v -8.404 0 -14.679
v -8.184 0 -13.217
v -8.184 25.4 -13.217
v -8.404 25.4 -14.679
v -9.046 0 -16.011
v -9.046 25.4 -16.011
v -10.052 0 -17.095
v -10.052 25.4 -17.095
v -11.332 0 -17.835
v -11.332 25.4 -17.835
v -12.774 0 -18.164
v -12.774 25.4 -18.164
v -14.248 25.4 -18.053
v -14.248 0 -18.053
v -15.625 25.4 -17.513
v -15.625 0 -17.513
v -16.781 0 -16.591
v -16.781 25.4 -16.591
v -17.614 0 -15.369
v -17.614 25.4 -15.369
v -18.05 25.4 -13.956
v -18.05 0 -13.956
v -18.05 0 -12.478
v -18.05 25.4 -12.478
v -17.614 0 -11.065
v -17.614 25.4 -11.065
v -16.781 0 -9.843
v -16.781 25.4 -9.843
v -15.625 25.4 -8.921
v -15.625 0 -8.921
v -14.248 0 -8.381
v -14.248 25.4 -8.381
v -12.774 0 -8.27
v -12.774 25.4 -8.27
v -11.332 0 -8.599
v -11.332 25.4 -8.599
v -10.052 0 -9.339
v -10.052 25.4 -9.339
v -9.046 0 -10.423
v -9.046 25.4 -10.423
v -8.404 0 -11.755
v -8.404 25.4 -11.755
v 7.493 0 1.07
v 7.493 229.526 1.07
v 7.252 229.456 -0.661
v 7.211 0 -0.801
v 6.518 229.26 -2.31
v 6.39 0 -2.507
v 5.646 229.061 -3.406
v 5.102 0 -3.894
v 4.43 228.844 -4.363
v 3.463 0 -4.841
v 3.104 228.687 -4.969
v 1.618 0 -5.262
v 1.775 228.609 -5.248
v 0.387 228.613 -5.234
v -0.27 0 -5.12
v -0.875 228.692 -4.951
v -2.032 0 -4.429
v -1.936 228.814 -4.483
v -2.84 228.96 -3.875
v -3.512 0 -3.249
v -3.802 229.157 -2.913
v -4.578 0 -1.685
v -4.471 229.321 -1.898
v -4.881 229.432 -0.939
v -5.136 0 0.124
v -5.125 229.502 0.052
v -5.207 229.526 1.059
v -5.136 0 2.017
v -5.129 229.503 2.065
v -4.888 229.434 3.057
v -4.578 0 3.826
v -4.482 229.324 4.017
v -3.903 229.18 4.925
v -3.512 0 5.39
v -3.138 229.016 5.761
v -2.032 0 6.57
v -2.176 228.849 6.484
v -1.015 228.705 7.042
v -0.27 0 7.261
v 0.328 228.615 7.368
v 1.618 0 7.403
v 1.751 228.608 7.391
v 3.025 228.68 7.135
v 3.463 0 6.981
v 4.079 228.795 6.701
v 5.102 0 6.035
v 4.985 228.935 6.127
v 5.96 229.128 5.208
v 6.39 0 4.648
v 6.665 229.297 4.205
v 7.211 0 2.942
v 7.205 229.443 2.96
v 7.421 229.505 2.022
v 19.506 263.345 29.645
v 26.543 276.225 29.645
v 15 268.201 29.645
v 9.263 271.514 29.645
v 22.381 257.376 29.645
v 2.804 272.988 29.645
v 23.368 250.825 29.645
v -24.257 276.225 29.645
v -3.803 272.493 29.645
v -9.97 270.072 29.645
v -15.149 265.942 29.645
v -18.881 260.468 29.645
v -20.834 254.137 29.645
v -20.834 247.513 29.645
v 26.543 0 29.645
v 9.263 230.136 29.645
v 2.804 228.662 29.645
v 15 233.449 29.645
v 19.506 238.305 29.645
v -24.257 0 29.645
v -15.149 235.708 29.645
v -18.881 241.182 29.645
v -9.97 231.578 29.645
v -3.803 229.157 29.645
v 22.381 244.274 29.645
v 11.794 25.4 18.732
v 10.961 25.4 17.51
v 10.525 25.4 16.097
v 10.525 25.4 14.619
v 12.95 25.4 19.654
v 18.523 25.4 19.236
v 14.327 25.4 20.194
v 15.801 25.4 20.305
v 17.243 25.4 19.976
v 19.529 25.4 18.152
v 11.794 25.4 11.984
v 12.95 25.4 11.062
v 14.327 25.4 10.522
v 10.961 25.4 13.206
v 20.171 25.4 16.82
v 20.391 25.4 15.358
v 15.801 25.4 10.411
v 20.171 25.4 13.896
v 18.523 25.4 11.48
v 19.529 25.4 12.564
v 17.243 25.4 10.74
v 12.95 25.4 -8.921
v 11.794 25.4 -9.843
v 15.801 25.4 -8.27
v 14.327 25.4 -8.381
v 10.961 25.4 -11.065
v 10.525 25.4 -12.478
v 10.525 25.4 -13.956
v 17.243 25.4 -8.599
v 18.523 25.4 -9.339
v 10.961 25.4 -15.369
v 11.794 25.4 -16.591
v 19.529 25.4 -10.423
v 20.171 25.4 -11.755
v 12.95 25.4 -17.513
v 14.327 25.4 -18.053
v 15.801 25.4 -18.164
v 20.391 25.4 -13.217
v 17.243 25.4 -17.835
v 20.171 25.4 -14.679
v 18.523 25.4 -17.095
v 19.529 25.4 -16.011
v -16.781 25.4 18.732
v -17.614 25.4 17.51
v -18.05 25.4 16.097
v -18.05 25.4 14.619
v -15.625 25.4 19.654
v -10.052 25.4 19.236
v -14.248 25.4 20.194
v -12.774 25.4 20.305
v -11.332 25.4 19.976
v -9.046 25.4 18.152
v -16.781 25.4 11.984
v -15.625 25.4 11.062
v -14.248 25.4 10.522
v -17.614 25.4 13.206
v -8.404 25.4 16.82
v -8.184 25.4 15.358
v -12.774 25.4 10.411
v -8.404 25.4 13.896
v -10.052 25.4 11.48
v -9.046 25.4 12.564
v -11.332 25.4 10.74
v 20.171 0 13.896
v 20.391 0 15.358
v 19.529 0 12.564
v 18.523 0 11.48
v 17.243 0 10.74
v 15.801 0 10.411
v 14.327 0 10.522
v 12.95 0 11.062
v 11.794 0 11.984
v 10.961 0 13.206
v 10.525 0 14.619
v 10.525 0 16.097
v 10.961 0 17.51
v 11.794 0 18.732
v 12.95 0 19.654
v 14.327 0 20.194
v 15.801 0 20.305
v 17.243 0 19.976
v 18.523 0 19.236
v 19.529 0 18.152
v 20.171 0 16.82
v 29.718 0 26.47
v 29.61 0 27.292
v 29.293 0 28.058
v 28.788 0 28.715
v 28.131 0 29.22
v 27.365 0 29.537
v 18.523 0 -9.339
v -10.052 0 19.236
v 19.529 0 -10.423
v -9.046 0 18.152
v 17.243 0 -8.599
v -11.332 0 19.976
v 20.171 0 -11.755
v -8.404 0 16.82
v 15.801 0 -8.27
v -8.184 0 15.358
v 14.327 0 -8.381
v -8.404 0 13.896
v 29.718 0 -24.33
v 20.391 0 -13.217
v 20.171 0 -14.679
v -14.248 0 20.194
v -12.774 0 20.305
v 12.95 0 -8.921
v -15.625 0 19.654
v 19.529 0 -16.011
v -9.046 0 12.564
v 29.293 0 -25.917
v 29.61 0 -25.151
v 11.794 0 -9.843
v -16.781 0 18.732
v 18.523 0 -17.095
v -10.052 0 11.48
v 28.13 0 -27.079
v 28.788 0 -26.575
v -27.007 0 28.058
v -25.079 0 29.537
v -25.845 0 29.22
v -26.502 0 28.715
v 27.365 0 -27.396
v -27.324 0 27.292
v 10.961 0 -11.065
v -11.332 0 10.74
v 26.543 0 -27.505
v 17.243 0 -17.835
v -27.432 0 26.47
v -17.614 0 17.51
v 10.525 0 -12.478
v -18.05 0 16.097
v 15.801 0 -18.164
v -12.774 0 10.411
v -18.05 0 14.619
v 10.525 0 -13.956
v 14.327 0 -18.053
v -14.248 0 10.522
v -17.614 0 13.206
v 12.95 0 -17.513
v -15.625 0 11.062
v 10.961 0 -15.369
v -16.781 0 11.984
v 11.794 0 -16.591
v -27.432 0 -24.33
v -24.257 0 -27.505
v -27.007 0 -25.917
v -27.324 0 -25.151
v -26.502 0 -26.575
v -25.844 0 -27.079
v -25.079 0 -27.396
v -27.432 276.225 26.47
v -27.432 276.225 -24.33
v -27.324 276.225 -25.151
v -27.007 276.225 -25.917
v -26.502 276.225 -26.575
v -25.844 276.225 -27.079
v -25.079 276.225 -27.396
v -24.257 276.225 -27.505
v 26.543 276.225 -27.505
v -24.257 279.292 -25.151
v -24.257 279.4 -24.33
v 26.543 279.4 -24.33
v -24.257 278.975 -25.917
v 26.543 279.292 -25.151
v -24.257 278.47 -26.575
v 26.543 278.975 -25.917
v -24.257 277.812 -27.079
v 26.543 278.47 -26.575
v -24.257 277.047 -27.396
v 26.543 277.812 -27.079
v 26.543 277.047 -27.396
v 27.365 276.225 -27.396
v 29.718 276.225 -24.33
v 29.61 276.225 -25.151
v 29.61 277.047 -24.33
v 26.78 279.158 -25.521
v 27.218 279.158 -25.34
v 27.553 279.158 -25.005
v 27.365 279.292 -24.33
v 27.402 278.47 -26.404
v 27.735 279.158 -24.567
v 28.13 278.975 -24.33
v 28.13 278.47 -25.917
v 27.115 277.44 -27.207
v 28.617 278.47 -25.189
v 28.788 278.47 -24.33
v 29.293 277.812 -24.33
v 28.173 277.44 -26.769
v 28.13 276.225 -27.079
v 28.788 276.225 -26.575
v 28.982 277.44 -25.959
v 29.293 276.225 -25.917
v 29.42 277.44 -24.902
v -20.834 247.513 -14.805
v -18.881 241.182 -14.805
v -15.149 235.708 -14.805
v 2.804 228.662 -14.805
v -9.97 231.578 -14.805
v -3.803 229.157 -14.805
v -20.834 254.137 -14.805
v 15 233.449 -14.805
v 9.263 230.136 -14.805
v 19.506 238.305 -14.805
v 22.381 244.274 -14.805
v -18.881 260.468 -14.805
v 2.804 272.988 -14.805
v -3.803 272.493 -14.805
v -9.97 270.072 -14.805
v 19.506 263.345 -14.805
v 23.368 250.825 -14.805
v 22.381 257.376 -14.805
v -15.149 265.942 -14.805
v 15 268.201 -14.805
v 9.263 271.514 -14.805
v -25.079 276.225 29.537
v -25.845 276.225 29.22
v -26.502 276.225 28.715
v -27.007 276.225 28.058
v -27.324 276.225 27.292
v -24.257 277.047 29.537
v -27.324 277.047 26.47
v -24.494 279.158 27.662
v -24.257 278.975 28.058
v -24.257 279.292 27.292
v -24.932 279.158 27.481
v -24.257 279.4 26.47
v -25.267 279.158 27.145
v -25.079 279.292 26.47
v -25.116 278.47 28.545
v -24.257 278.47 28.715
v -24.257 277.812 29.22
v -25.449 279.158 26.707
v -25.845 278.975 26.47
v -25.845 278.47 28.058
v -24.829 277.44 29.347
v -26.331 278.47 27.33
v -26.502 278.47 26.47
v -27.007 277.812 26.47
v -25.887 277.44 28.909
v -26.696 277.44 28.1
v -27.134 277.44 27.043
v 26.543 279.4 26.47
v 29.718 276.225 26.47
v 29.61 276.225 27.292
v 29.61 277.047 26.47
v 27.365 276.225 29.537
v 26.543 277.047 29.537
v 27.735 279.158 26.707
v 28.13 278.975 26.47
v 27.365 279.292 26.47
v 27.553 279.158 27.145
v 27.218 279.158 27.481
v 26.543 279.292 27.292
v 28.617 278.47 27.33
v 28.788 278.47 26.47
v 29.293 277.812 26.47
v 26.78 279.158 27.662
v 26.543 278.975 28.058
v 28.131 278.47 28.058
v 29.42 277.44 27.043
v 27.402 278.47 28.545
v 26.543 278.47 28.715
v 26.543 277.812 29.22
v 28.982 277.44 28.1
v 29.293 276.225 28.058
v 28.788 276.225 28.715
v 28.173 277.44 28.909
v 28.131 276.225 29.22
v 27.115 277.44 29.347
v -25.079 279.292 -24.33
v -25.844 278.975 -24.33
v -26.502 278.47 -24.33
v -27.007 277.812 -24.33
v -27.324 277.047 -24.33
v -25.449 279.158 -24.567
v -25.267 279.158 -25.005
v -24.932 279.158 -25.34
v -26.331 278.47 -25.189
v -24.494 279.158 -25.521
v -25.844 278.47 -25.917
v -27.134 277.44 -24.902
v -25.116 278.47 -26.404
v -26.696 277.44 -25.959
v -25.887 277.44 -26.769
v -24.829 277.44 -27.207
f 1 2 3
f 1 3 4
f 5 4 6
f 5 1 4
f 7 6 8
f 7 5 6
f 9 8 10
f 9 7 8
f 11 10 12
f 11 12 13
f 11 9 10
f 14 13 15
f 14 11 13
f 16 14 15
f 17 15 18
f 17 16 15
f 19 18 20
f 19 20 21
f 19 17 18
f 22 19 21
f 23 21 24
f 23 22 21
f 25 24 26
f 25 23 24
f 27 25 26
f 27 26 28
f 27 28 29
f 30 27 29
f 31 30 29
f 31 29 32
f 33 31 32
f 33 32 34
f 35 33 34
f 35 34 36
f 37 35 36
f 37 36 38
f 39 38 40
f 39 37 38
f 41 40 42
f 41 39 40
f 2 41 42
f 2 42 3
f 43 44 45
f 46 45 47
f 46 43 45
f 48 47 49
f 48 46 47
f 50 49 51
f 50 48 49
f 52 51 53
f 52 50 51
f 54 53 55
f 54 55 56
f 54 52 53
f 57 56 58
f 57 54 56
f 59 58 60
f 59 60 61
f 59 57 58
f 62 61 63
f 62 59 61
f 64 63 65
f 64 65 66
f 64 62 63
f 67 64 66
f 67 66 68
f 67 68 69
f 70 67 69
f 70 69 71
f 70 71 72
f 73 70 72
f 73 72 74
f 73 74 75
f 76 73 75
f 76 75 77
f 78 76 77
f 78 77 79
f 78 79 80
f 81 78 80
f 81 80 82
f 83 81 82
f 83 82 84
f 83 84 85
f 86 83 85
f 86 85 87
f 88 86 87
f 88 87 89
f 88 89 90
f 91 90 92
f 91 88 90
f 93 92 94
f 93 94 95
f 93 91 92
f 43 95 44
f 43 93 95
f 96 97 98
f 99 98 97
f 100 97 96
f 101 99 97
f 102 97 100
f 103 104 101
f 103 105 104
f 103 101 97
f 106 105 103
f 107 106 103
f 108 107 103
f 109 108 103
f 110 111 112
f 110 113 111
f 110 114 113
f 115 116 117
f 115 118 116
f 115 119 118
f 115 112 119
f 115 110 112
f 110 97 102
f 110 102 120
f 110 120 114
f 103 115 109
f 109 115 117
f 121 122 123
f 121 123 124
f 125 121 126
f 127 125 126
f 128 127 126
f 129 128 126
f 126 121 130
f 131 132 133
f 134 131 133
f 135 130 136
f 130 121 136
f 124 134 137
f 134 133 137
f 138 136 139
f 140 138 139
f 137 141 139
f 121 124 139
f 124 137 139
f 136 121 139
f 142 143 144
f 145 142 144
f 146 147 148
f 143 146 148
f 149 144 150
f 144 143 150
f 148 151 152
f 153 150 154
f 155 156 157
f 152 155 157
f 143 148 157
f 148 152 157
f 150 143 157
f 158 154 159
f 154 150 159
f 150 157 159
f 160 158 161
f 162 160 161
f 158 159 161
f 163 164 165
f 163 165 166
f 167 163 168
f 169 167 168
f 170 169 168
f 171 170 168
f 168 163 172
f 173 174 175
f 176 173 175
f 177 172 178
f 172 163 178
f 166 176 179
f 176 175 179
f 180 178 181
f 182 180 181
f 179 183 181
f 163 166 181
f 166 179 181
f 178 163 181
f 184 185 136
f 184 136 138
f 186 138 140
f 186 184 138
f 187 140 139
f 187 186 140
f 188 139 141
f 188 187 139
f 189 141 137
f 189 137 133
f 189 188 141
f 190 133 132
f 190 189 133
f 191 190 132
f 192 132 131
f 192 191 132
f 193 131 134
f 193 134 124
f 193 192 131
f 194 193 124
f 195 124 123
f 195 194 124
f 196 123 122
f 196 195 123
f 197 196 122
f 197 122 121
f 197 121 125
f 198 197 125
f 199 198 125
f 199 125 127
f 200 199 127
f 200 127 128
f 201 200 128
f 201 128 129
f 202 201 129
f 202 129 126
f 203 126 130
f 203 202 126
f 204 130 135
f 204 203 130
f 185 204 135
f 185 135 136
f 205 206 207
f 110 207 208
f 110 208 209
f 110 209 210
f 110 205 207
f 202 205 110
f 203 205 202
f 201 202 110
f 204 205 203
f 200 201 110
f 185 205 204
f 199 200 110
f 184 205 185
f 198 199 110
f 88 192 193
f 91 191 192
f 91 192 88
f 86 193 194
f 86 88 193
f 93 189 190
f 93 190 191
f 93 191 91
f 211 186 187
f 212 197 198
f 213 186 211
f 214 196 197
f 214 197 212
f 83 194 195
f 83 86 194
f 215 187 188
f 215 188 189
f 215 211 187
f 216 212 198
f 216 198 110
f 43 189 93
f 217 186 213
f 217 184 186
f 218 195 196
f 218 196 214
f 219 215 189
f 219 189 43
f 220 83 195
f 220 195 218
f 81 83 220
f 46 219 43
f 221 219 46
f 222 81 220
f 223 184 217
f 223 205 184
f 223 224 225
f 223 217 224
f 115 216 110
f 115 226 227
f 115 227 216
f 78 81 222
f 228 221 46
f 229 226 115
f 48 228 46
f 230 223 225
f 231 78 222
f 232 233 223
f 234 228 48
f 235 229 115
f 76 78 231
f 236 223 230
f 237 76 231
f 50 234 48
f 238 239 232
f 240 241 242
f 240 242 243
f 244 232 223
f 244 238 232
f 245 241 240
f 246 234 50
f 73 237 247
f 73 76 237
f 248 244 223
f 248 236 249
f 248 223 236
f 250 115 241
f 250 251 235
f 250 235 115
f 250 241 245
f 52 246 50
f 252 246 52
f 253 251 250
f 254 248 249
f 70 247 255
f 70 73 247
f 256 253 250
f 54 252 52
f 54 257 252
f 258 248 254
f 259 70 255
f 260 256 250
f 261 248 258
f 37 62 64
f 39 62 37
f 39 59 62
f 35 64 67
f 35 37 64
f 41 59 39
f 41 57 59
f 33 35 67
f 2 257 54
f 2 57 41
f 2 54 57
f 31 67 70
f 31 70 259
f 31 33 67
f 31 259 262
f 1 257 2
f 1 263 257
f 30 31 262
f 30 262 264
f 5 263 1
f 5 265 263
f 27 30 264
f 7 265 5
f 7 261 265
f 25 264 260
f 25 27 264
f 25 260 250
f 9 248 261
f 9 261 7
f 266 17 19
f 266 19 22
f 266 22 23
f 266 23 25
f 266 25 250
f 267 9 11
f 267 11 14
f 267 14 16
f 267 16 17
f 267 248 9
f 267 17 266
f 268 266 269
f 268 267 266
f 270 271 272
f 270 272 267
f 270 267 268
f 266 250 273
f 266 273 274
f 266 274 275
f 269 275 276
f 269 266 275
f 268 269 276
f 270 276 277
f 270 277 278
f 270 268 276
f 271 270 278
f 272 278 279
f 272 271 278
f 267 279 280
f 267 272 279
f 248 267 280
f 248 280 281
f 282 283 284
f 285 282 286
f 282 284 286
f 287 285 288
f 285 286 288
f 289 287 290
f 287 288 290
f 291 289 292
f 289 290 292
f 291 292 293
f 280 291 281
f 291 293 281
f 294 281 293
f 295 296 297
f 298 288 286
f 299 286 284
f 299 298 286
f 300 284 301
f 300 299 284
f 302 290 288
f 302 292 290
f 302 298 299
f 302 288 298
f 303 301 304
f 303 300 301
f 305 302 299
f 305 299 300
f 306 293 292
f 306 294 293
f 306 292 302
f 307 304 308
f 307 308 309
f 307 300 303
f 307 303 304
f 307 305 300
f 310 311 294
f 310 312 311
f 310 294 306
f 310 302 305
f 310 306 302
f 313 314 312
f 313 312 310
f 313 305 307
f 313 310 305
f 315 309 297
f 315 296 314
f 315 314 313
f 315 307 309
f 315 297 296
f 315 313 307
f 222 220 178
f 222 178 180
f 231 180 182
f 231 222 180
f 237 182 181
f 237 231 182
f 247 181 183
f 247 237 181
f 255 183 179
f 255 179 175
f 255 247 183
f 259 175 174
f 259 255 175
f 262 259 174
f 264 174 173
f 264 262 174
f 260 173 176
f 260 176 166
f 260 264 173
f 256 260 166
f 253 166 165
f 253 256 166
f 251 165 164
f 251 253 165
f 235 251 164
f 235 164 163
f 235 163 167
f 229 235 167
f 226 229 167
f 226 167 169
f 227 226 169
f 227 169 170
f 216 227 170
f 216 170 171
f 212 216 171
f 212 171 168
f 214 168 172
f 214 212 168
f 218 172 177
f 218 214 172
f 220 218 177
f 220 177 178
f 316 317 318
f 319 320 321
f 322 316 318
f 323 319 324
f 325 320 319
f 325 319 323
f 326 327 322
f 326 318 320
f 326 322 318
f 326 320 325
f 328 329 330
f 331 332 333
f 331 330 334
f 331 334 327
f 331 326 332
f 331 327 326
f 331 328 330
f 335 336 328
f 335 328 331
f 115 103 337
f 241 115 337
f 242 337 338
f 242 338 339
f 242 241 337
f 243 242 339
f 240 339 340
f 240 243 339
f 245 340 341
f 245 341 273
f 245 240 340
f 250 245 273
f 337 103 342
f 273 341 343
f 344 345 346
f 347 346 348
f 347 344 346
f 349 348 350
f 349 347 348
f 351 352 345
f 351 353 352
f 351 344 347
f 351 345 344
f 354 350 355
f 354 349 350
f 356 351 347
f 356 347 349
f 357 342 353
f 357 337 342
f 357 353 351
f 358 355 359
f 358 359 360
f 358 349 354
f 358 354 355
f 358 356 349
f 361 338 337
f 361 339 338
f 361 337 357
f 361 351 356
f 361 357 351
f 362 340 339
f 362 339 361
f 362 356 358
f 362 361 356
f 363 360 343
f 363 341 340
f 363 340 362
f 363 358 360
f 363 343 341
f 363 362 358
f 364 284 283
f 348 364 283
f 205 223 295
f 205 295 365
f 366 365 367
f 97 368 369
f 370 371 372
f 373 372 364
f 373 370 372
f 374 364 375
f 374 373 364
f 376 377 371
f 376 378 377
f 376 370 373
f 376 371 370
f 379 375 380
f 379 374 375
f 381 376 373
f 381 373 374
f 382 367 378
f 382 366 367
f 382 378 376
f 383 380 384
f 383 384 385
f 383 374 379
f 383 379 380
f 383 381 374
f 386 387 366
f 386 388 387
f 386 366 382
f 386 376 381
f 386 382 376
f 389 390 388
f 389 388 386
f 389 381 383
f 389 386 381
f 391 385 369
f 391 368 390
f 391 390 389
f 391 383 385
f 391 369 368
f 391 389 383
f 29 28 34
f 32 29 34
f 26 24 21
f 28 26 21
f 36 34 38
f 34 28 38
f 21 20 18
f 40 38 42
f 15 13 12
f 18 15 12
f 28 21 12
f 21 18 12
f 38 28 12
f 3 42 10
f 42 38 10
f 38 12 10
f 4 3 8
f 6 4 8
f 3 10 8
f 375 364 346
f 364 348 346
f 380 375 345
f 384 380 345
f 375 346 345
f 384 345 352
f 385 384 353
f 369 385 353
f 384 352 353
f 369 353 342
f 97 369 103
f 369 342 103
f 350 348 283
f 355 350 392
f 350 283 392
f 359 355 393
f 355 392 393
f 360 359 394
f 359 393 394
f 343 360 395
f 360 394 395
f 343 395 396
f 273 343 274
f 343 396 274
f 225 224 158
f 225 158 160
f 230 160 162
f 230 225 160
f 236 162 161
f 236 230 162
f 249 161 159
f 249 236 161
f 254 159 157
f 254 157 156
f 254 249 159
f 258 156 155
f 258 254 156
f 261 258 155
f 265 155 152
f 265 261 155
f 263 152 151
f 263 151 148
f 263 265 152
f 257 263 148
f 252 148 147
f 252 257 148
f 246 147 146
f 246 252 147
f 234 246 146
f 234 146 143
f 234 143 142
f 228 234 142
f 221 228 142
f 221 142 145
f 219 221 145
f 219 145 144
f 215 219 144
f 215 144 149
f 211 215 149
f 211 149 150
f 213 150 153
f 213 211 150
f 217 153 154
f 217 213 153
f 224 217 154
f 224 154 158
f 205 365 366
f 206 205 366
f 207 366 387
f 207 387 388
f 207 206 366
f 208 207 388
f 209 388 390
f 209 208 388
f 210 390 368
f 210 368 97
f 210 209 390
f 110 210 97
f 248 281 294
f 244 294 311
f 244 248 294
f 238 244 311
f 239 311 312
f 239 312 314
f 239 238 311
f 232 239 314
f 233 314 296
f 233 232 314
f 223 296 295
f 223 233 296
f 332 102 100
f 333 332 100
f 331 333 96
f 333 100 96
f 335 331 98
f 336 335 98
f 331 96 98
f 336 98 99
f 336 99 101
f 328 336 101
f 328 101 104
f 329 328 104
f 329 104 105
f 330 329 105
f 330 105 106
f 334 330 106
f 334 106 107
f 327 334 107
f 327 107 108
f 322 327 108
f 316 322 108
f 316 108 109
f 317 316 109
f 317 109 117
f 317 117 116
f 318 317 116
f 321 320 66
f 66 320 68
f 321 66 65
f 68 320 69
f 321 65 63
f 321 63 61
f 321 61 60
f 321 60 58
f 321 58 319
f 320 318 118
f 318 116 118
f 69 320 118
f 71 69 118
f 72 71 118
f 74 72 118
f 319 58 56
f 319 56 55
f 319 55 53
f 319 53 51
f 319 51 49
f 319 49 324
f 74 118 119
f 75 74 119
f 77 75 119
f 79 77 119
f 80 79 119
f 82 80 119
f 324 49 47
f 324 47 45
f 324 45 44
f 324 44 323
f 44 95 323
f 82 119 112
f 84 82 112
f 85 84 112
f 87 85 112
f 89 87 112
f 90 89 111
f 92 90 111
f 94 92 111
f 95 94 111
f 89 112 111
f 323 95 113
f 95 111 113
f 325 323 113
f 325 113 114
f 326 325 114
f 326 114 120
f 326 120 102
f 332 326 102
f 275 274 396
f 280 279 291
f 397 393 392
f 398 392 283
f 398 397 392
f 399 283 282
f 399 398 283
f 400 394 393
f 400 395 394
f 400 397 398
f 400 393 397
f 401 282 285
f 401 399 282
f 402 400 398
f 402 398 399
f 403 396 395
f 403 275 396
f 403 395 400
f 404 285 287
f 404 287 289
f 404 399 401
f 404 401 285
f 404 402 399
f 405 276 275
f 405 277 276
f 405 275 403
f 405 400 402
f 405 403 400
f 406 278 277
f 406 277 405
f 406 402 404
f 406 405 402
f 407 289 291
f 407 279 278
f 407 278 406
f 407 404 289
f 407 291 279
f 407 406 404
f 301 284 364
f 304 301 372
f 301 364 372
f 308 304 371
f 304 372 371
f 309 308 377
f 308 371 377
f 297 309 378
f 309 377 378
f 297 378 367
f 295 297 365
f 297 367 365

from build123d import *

# Parameters (mm, degrees)
BOSS_EXTRUDE1_DEPTH = 279.4
SKETCH1_4_R         = 4.96062
CUT_EXTRUDE1_DEPTH  = 25.4
SKETCH1_5_R         = 6.35
CUT_EXTRUDE2_DEPTH  = 250.825
FILLET1_R           = 3.175
SKETCH4_R           = 22.225
CUT_EXTRUDE3_DEPTH  = 44.45


with BuildPart() as part:
    # Sketch1 → Boss-Extrude1 (new body)
    with BuildSketch(Plane(origin=(0, 0, 0), x_dir=(1, 0, 0), z_dir=(0, 1, 0))):
        with BuildLine():
            Line((-24.257, 27.504571429), (26.543, 27.504571429))
            ThreePointArc((26.543, 27.504571429), (28.78806403, 26.574635459), (29.718, 24.329571429))
            Line((29.718, 24.329571429), (29.718, -26.470428571))
            ThreePointArc((29.718, -26.470428571), (28.78806403, -28.715492602), (26.543, -29.645428571))
            Line((26.543, -29.645428571), (-24.257, -29.645428571))
            ThreePointArc((-24.257, -29.645428571), (-26.50206403, -28.715492602), (-27.432, -26.470428571))
            Line((-27.432, -26.470428571), (-27.432, 24.329571429))
            ThreePointArc((-27.432, 24.329571429), (-26.50206403, 26.574635459), (-24.257, 27.504571429))
        make_face()
    extrude(amount=BOSS_EXTRUDE1_DEPTH)

    # Sketch1<4> → Cut-Extrude1 (cut)
    with BuildSketch(Plane(origin=(0, 0, 0), x_dir=(1, 0, 0), z_dir=(0, 1, 0))):
        with Locations((-13.1445, 13.217071429)):
            Circle(SKETCH1_4_R)
        with Locations((15.4305, 13.217071429)):
            Circle(SKETCH1_4_R)
        with Locations((15.4305, -15.357928571)):
            Circle(SKETCH1_4_R)
        with Locations((-13.1445, -15.357928571)):
            Circle(SKETCH1_4_R)
    extrude(amount=CUT_EXTRUDE1_DEPTH, mode=Mode.SUBTRACT)

    # Sketch1<5> → Cut-Extrude2 (cut)
    with BuildSketch(Plane(origin=(0, 0, 0), x_dir=(1, 0, 0), z_dir=(0, 1, 0))):
        with Locations((1.143, -1.070428571)):
            Circle(SKETCH1_5_R)
    extrude(amount=CUT_EXTRUDE2_DEPTH, mode=Mode.SUBTRACT)

    # Fillet1
    fillet1_edges = [part.edges().sort_by_distance(p)[0] for p in [
        (-26.50206403, 279.4, 28.715492602),
        (1.143, 279.4, 29.645428571),
        (28.78806403, 279.4, 28.715492602),
        (29.718, 279.4, 1.070428571),
        (28.78806403, 279.4, -26.574635459),
        (1.143, 279.4, -27.504571429),
        (-26.50206403, 279.4, -26.574635459),
        (-27.432, 279.4, 1.070428571),
    ]]
    fillet(fillet1_edges, radius=FILLET1_R)

    # Sketch4 → Cut-Extrude3 (cut)
    with BuildSketch(Plane.XY.offset(29.645428571)):
        with Locations((1.143, 250.825)):
            Circle(SKETCH4_R)
    extrude(amount=-CUT_EXTRUDE3_DEPTH, mode=Mode.SUBTRACT)


solid = part.part
